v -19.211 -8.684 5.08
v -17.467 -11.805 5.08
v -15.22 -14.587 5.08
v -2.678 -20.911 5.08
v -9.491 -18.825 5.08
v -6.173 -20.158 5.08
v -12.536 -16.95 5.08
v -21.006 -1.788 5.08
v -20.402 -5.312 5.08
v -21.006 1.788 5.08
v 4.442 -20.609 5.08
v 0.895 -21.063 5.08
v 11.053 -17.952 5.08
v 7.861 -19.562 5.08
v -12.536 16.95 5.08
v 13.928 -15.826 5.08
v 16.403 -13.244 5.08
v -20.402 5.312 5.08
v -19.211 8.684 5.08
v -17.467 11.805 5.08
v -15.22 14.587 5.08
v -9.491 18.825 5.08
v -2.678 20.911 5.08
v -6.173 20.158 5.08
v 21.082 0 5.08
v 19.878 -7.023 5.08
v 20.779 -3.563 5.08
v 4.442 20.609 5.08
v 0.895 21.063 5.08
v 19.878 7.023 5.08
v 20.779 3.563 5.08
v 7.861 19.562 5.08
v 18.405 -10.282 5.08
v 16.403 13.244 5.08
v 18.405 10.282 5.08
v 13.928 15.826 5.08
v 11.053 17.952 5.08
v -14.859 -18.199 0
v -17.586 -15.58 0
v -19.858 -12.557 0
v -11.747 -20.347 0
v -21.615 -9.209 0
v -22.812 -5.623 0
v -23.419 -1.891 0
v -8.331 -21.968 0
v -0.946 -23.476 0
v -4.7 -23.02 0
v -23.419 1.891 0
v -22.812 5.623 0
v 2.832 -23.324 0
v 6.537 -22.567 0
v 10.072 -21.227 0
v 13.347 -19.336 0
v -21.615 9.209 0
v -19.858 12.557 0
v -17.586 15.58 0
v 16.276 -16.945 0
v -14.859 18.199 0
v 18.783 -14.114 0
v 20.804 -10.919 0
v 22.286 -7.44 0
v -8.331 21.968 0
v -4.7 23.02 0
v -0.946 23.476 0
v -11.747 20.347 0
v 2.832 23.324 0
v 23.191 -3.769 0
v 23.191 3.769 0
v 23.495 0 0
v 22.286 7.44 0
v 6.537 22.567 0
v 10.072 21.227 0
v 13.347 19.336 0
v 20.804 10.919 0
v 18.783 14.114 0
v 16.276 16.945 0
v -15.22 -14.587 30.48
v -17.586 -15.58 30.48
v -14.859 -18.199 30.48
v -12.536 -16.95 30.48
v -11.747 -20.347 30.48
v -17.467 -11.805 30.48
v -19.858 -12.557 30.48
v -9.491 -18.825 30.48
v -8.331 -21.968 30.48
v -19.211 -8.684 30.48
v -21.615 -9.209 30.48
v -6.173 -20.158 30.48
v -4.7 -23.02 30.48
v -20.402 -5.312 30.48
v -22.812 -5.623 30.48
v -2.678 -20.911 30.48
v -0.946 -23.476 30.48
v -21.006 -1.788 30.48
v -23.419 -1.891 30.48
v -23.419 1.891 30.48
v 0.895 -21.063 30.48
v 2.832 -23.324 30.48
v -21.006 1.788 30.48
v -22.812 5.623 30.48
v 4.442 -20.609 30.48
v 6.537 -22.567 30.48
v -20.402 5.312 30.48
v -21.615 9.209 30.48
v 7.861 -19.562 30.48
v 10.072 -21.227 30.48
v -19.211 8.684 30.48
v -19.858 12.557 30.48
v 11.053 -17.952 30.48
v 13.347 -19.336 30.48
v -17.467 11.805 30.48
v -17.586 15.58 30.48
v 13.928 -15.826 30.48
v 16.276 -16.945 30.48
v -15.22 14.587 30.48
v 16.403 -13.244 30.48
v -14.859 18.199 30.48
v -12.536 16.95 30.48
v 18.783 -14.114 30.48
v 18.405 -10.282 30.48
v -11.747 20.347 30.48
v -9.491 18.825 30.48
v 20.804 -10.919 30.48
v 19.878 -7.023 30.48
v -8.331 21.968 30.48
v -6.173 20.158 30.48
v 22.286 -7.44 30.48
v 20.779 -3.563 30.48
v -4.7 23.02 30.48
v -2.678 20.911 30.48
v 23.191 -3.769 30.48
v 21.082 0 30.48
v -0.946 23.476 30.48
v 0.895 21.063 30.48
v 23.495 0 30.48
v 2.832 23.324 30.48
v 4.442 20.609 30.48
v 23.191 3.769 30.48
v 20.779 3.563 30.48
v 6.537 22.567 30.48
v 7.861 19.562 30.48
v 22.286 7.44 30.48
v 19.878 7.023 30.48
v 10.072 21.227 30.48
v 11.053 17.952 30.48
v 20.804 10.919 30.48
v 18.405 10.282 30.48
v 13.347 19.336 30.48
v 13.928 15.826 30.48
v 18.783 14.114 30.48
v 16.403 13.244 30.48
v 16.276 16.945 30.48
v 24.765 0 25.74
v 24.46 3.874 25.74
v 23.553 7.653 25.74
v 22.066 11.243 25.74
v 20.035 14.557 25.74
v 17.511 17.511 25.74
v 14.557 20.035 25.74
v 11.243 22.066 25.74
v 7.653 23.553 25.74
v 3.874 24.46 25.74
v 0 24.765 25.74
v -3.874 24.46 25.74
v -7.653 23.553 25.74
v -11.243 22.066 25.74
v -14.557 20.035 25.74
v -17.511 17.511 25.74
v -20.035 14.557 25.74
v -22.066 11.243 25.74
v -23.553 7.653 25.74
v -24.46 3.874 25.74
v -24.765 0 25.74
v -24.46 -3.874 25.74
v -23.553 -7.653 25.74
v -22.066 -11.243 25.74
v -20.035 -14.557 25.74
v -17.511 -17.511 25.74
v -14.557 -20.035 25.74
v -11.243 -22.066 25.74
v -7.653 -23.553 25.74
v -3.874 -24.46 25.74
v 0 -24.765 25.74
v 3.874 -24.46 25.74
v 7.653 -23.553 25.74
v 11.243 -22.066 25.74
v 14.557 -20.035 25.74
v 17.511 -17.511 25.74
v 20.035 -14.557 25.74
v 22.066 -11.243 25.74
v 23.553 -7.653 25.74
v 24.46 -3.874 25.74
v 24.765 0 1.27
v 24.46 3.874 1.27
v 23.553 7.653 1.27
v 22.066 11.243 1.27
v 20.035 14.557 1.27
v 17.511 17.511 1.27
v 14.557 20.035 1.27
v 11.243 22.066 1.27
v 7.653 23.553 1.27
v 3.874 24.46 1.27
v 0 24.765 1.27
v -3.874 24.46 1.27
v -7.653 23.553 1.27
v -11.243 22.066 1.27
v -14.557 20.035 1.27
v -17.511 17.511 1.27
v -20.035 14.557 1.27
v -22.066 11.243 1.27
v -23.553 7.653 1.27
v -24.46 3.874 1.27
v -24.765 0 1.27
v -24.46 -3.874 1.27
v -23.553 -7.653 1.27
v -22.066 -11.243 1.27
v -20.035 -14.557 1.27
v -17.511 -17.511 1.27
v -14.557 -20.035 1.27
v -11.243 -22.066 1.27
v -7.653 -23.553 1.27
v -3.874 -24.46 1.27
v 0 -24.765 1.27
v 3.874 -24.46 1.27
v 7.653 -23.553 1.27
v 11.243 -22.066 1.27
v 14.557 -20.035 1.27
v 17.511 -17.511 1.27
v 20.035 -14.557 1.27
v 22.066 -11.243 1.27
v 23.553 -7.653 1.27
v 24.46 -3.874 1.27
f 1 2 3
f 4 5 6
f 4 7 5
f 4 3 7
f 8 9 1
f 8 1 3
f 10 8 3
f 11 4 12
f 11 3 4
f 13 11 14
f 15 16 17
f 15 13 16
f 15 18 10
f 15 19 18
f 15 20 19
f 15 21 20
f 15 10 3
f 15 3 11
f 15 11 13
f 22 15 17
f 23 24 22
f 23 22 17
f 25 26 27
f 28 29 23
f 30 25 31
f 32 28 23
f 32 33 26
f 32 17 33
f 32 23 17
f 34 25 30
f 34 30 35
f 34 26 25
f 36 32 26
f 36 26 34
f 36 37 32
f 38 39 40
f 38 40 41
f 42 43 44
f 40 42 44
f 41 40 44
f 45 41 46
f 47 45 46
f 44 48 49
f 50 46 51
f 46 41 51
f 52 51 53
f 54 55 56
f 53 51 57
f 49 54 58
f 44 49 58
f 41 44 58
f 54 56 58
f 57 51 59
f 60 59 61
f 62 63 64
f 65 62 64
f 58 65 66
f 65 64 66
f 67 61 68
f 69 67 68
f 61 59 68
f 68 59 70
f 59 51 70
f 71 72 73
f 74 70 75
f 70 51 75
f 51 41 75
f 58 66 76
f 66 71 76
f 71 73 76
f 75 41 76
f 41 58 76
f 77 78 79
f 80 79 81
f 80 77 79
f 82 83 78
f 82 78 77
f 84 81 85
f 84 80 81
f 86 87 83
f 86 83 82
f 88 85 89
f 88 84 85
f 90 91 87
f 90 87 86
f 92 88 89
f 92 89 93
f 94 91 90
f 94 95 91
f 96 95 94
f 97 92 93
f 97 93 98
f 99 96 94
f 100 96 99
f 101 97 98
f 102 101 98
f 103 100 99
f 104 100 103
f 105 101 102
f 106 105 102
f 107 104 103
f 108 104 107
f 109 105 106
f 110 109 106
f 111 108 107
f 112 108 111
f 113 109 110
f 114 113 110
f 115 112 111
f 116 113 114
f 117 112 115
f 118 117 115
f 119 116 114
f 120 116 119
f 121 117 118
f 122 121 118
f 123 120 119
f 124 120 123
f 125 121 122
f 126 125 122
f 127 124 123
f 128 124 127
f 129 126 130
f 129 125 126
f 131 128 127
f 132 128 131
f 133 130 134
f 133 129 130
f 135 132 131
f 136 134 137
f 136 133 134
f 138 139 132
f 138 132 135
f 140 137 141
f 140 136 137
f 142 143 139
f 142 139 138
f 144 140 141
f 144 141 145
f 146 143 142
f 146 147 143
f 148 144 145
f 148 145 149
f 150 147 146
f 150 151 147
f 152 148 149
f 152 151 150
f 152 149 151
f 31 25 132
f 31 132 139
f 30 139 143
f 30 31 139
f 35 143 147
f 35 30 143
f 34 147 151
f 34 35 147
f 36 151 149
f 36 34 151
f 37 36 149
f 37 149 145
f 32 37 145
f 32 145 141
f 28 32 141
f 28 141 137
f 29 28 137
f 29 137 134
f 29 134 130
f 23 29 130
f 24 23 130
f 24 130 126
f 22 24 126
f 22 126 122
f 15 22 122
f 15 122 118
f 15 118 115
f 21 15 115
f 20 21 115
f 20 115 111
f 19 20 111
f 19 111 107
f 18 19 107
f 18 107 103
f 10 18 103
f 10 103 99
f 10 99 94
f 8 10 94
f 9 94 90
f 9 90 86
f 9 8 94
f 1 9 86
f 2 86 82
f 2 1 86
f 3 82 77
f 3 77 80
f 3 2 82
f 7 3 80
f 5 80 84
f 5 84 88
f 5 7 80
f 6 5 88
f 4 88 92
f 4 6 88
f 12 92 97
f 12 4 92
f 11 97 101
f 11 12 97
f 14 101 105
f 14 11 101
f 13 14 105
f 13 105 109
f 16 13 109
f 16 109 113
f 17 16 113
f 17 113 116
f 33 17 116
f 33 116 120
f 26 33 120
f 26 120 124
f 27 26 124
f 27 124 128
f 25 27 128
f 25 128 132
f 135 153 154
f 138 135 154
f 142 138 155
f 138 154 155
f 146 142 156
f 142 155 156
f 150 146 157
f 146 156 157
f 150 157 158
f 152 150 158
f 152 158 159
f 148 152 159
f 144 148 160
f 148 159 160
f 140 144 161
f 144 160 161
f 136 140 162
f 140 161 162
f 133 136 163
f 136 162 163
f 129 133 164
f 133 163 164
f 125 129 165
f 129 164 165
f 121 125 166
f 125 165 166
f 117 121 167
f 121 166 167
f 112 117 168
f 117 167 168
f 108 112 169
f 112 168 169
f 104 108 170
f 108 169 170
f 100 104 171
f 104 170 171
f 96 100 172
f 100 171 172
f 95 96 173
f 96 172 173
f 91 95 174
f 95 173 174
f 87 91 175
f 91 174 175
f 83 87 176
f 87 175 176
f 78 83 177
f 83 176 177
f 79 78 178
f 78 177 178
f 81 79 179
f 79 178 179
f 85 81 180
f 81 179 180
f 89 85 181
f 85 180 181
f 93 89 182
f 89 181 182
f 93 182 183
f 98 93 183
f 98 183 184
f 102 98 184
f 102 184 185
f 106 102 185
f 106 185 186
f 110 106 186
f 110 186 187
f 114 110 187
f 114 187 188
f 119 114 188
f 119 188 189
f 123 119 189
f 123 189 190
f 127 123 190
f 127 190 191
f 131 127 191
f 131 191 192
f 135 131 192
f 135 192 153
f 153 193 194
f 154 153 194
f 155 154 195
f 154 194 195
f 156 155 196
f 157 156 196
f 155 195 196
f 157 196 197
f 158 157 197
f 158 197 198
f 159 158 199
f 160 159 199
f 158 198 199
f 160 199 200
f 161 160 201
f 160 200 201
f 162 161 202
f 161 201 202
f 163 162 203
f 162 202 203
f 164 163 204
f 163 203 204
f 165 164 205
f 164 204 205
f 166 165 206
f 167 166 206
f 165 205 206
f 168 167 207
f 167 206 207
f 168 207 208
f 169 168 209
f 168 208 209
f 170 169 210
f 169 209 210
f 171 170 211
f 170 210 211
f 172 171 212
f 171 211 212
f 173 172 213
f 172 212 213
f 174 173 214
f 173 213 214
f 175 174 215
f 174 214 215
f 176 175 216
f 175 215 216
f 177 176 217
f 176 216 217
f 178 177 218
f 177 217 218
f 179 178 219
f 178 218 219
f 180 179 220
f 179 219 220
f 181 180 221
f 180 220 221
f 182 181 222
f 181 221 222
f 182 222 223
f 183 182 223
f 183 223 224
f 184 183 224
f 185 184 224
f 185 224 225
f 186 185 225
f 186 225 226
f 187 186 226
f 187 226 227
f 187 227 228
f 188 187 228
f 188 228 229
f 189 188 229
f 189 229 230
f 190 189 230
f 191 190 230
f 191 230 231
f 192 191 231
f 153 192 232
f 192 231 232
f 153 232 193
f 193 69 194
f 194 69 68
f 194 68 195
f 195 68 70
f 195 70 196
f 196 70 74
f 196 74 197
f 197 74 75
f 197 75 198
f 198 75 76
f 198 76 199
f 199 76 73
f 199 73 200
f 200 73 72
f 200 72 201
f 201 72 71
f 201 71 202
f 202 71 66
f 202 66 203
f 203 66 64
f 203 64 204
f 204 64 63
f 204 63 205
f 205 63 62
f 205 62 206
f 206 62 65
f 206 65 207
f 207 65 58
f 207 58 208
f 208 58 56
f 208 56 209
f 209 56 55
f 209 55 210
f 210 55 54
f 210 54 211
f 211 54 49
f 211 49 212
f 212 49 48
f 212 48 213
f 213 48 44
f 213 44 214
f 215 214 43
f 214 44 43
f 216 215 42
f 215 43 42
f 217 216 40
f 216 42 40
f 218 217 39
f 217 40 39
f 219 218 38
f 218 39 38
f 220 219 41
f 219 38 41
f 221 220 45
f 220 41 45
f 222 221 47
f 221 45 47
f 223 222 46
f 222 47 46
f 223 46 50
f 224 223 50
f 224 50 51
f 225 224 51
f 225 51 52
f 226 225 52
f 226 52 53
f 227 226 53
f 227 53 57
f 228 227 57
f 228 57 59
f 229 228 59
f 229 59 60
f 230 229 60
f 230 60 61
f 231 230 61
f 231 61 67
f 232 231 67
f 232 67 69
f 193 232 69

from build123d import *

# Parameters (mm, degrees)
F0_R     = 24.765
F0_R_2   = 21.082
F1_DEPTH = 30.48
F2_DEPTH = 5.08
F3_SIZE2 = 4.7397045256
F3_SIZE  = 1.27
F4_SIZE  = 1.27


with BuildPart() as f1:
    # F0 (on Top) → F1 (new body)
    with BuildSketch(Plane.XY):
        Circle(F0_R)
        Circle(F0_R_2, mode=Mode.SUBTRACT)
    extrude(amount=F1_DEPTH)

    # F0 (on Top) → F2 (join)
    with BuildSketch(Plane.XY):
        Circle(F0_R)
        Circle(F0_R_2, mode=Mode.SUBTRACT)
        Circle(F0_R_2)
    extrude(amount=F2_DEPTH)

    # F3
    f3_edges = [f1.edges().sort_by_distance(p)[0] for p in [
        (-24.765, 0, 30.48),
    ]]
    f3_side = f1.faces().sort_by_distance((-24.06454, 0, 30.48))[0]
    chamfer(f3_edges, length=F3_SIZE, length2=F3_SIZE2, reference=f3_side)

    # F4
    f4_edges = [f1.edges().sort_by_distance(p)[0] for p in [
        (-24.765, 0, 0),
    ]]
    chamfer(f4_edges, length=F4_SIZE)


solid = f1.part
